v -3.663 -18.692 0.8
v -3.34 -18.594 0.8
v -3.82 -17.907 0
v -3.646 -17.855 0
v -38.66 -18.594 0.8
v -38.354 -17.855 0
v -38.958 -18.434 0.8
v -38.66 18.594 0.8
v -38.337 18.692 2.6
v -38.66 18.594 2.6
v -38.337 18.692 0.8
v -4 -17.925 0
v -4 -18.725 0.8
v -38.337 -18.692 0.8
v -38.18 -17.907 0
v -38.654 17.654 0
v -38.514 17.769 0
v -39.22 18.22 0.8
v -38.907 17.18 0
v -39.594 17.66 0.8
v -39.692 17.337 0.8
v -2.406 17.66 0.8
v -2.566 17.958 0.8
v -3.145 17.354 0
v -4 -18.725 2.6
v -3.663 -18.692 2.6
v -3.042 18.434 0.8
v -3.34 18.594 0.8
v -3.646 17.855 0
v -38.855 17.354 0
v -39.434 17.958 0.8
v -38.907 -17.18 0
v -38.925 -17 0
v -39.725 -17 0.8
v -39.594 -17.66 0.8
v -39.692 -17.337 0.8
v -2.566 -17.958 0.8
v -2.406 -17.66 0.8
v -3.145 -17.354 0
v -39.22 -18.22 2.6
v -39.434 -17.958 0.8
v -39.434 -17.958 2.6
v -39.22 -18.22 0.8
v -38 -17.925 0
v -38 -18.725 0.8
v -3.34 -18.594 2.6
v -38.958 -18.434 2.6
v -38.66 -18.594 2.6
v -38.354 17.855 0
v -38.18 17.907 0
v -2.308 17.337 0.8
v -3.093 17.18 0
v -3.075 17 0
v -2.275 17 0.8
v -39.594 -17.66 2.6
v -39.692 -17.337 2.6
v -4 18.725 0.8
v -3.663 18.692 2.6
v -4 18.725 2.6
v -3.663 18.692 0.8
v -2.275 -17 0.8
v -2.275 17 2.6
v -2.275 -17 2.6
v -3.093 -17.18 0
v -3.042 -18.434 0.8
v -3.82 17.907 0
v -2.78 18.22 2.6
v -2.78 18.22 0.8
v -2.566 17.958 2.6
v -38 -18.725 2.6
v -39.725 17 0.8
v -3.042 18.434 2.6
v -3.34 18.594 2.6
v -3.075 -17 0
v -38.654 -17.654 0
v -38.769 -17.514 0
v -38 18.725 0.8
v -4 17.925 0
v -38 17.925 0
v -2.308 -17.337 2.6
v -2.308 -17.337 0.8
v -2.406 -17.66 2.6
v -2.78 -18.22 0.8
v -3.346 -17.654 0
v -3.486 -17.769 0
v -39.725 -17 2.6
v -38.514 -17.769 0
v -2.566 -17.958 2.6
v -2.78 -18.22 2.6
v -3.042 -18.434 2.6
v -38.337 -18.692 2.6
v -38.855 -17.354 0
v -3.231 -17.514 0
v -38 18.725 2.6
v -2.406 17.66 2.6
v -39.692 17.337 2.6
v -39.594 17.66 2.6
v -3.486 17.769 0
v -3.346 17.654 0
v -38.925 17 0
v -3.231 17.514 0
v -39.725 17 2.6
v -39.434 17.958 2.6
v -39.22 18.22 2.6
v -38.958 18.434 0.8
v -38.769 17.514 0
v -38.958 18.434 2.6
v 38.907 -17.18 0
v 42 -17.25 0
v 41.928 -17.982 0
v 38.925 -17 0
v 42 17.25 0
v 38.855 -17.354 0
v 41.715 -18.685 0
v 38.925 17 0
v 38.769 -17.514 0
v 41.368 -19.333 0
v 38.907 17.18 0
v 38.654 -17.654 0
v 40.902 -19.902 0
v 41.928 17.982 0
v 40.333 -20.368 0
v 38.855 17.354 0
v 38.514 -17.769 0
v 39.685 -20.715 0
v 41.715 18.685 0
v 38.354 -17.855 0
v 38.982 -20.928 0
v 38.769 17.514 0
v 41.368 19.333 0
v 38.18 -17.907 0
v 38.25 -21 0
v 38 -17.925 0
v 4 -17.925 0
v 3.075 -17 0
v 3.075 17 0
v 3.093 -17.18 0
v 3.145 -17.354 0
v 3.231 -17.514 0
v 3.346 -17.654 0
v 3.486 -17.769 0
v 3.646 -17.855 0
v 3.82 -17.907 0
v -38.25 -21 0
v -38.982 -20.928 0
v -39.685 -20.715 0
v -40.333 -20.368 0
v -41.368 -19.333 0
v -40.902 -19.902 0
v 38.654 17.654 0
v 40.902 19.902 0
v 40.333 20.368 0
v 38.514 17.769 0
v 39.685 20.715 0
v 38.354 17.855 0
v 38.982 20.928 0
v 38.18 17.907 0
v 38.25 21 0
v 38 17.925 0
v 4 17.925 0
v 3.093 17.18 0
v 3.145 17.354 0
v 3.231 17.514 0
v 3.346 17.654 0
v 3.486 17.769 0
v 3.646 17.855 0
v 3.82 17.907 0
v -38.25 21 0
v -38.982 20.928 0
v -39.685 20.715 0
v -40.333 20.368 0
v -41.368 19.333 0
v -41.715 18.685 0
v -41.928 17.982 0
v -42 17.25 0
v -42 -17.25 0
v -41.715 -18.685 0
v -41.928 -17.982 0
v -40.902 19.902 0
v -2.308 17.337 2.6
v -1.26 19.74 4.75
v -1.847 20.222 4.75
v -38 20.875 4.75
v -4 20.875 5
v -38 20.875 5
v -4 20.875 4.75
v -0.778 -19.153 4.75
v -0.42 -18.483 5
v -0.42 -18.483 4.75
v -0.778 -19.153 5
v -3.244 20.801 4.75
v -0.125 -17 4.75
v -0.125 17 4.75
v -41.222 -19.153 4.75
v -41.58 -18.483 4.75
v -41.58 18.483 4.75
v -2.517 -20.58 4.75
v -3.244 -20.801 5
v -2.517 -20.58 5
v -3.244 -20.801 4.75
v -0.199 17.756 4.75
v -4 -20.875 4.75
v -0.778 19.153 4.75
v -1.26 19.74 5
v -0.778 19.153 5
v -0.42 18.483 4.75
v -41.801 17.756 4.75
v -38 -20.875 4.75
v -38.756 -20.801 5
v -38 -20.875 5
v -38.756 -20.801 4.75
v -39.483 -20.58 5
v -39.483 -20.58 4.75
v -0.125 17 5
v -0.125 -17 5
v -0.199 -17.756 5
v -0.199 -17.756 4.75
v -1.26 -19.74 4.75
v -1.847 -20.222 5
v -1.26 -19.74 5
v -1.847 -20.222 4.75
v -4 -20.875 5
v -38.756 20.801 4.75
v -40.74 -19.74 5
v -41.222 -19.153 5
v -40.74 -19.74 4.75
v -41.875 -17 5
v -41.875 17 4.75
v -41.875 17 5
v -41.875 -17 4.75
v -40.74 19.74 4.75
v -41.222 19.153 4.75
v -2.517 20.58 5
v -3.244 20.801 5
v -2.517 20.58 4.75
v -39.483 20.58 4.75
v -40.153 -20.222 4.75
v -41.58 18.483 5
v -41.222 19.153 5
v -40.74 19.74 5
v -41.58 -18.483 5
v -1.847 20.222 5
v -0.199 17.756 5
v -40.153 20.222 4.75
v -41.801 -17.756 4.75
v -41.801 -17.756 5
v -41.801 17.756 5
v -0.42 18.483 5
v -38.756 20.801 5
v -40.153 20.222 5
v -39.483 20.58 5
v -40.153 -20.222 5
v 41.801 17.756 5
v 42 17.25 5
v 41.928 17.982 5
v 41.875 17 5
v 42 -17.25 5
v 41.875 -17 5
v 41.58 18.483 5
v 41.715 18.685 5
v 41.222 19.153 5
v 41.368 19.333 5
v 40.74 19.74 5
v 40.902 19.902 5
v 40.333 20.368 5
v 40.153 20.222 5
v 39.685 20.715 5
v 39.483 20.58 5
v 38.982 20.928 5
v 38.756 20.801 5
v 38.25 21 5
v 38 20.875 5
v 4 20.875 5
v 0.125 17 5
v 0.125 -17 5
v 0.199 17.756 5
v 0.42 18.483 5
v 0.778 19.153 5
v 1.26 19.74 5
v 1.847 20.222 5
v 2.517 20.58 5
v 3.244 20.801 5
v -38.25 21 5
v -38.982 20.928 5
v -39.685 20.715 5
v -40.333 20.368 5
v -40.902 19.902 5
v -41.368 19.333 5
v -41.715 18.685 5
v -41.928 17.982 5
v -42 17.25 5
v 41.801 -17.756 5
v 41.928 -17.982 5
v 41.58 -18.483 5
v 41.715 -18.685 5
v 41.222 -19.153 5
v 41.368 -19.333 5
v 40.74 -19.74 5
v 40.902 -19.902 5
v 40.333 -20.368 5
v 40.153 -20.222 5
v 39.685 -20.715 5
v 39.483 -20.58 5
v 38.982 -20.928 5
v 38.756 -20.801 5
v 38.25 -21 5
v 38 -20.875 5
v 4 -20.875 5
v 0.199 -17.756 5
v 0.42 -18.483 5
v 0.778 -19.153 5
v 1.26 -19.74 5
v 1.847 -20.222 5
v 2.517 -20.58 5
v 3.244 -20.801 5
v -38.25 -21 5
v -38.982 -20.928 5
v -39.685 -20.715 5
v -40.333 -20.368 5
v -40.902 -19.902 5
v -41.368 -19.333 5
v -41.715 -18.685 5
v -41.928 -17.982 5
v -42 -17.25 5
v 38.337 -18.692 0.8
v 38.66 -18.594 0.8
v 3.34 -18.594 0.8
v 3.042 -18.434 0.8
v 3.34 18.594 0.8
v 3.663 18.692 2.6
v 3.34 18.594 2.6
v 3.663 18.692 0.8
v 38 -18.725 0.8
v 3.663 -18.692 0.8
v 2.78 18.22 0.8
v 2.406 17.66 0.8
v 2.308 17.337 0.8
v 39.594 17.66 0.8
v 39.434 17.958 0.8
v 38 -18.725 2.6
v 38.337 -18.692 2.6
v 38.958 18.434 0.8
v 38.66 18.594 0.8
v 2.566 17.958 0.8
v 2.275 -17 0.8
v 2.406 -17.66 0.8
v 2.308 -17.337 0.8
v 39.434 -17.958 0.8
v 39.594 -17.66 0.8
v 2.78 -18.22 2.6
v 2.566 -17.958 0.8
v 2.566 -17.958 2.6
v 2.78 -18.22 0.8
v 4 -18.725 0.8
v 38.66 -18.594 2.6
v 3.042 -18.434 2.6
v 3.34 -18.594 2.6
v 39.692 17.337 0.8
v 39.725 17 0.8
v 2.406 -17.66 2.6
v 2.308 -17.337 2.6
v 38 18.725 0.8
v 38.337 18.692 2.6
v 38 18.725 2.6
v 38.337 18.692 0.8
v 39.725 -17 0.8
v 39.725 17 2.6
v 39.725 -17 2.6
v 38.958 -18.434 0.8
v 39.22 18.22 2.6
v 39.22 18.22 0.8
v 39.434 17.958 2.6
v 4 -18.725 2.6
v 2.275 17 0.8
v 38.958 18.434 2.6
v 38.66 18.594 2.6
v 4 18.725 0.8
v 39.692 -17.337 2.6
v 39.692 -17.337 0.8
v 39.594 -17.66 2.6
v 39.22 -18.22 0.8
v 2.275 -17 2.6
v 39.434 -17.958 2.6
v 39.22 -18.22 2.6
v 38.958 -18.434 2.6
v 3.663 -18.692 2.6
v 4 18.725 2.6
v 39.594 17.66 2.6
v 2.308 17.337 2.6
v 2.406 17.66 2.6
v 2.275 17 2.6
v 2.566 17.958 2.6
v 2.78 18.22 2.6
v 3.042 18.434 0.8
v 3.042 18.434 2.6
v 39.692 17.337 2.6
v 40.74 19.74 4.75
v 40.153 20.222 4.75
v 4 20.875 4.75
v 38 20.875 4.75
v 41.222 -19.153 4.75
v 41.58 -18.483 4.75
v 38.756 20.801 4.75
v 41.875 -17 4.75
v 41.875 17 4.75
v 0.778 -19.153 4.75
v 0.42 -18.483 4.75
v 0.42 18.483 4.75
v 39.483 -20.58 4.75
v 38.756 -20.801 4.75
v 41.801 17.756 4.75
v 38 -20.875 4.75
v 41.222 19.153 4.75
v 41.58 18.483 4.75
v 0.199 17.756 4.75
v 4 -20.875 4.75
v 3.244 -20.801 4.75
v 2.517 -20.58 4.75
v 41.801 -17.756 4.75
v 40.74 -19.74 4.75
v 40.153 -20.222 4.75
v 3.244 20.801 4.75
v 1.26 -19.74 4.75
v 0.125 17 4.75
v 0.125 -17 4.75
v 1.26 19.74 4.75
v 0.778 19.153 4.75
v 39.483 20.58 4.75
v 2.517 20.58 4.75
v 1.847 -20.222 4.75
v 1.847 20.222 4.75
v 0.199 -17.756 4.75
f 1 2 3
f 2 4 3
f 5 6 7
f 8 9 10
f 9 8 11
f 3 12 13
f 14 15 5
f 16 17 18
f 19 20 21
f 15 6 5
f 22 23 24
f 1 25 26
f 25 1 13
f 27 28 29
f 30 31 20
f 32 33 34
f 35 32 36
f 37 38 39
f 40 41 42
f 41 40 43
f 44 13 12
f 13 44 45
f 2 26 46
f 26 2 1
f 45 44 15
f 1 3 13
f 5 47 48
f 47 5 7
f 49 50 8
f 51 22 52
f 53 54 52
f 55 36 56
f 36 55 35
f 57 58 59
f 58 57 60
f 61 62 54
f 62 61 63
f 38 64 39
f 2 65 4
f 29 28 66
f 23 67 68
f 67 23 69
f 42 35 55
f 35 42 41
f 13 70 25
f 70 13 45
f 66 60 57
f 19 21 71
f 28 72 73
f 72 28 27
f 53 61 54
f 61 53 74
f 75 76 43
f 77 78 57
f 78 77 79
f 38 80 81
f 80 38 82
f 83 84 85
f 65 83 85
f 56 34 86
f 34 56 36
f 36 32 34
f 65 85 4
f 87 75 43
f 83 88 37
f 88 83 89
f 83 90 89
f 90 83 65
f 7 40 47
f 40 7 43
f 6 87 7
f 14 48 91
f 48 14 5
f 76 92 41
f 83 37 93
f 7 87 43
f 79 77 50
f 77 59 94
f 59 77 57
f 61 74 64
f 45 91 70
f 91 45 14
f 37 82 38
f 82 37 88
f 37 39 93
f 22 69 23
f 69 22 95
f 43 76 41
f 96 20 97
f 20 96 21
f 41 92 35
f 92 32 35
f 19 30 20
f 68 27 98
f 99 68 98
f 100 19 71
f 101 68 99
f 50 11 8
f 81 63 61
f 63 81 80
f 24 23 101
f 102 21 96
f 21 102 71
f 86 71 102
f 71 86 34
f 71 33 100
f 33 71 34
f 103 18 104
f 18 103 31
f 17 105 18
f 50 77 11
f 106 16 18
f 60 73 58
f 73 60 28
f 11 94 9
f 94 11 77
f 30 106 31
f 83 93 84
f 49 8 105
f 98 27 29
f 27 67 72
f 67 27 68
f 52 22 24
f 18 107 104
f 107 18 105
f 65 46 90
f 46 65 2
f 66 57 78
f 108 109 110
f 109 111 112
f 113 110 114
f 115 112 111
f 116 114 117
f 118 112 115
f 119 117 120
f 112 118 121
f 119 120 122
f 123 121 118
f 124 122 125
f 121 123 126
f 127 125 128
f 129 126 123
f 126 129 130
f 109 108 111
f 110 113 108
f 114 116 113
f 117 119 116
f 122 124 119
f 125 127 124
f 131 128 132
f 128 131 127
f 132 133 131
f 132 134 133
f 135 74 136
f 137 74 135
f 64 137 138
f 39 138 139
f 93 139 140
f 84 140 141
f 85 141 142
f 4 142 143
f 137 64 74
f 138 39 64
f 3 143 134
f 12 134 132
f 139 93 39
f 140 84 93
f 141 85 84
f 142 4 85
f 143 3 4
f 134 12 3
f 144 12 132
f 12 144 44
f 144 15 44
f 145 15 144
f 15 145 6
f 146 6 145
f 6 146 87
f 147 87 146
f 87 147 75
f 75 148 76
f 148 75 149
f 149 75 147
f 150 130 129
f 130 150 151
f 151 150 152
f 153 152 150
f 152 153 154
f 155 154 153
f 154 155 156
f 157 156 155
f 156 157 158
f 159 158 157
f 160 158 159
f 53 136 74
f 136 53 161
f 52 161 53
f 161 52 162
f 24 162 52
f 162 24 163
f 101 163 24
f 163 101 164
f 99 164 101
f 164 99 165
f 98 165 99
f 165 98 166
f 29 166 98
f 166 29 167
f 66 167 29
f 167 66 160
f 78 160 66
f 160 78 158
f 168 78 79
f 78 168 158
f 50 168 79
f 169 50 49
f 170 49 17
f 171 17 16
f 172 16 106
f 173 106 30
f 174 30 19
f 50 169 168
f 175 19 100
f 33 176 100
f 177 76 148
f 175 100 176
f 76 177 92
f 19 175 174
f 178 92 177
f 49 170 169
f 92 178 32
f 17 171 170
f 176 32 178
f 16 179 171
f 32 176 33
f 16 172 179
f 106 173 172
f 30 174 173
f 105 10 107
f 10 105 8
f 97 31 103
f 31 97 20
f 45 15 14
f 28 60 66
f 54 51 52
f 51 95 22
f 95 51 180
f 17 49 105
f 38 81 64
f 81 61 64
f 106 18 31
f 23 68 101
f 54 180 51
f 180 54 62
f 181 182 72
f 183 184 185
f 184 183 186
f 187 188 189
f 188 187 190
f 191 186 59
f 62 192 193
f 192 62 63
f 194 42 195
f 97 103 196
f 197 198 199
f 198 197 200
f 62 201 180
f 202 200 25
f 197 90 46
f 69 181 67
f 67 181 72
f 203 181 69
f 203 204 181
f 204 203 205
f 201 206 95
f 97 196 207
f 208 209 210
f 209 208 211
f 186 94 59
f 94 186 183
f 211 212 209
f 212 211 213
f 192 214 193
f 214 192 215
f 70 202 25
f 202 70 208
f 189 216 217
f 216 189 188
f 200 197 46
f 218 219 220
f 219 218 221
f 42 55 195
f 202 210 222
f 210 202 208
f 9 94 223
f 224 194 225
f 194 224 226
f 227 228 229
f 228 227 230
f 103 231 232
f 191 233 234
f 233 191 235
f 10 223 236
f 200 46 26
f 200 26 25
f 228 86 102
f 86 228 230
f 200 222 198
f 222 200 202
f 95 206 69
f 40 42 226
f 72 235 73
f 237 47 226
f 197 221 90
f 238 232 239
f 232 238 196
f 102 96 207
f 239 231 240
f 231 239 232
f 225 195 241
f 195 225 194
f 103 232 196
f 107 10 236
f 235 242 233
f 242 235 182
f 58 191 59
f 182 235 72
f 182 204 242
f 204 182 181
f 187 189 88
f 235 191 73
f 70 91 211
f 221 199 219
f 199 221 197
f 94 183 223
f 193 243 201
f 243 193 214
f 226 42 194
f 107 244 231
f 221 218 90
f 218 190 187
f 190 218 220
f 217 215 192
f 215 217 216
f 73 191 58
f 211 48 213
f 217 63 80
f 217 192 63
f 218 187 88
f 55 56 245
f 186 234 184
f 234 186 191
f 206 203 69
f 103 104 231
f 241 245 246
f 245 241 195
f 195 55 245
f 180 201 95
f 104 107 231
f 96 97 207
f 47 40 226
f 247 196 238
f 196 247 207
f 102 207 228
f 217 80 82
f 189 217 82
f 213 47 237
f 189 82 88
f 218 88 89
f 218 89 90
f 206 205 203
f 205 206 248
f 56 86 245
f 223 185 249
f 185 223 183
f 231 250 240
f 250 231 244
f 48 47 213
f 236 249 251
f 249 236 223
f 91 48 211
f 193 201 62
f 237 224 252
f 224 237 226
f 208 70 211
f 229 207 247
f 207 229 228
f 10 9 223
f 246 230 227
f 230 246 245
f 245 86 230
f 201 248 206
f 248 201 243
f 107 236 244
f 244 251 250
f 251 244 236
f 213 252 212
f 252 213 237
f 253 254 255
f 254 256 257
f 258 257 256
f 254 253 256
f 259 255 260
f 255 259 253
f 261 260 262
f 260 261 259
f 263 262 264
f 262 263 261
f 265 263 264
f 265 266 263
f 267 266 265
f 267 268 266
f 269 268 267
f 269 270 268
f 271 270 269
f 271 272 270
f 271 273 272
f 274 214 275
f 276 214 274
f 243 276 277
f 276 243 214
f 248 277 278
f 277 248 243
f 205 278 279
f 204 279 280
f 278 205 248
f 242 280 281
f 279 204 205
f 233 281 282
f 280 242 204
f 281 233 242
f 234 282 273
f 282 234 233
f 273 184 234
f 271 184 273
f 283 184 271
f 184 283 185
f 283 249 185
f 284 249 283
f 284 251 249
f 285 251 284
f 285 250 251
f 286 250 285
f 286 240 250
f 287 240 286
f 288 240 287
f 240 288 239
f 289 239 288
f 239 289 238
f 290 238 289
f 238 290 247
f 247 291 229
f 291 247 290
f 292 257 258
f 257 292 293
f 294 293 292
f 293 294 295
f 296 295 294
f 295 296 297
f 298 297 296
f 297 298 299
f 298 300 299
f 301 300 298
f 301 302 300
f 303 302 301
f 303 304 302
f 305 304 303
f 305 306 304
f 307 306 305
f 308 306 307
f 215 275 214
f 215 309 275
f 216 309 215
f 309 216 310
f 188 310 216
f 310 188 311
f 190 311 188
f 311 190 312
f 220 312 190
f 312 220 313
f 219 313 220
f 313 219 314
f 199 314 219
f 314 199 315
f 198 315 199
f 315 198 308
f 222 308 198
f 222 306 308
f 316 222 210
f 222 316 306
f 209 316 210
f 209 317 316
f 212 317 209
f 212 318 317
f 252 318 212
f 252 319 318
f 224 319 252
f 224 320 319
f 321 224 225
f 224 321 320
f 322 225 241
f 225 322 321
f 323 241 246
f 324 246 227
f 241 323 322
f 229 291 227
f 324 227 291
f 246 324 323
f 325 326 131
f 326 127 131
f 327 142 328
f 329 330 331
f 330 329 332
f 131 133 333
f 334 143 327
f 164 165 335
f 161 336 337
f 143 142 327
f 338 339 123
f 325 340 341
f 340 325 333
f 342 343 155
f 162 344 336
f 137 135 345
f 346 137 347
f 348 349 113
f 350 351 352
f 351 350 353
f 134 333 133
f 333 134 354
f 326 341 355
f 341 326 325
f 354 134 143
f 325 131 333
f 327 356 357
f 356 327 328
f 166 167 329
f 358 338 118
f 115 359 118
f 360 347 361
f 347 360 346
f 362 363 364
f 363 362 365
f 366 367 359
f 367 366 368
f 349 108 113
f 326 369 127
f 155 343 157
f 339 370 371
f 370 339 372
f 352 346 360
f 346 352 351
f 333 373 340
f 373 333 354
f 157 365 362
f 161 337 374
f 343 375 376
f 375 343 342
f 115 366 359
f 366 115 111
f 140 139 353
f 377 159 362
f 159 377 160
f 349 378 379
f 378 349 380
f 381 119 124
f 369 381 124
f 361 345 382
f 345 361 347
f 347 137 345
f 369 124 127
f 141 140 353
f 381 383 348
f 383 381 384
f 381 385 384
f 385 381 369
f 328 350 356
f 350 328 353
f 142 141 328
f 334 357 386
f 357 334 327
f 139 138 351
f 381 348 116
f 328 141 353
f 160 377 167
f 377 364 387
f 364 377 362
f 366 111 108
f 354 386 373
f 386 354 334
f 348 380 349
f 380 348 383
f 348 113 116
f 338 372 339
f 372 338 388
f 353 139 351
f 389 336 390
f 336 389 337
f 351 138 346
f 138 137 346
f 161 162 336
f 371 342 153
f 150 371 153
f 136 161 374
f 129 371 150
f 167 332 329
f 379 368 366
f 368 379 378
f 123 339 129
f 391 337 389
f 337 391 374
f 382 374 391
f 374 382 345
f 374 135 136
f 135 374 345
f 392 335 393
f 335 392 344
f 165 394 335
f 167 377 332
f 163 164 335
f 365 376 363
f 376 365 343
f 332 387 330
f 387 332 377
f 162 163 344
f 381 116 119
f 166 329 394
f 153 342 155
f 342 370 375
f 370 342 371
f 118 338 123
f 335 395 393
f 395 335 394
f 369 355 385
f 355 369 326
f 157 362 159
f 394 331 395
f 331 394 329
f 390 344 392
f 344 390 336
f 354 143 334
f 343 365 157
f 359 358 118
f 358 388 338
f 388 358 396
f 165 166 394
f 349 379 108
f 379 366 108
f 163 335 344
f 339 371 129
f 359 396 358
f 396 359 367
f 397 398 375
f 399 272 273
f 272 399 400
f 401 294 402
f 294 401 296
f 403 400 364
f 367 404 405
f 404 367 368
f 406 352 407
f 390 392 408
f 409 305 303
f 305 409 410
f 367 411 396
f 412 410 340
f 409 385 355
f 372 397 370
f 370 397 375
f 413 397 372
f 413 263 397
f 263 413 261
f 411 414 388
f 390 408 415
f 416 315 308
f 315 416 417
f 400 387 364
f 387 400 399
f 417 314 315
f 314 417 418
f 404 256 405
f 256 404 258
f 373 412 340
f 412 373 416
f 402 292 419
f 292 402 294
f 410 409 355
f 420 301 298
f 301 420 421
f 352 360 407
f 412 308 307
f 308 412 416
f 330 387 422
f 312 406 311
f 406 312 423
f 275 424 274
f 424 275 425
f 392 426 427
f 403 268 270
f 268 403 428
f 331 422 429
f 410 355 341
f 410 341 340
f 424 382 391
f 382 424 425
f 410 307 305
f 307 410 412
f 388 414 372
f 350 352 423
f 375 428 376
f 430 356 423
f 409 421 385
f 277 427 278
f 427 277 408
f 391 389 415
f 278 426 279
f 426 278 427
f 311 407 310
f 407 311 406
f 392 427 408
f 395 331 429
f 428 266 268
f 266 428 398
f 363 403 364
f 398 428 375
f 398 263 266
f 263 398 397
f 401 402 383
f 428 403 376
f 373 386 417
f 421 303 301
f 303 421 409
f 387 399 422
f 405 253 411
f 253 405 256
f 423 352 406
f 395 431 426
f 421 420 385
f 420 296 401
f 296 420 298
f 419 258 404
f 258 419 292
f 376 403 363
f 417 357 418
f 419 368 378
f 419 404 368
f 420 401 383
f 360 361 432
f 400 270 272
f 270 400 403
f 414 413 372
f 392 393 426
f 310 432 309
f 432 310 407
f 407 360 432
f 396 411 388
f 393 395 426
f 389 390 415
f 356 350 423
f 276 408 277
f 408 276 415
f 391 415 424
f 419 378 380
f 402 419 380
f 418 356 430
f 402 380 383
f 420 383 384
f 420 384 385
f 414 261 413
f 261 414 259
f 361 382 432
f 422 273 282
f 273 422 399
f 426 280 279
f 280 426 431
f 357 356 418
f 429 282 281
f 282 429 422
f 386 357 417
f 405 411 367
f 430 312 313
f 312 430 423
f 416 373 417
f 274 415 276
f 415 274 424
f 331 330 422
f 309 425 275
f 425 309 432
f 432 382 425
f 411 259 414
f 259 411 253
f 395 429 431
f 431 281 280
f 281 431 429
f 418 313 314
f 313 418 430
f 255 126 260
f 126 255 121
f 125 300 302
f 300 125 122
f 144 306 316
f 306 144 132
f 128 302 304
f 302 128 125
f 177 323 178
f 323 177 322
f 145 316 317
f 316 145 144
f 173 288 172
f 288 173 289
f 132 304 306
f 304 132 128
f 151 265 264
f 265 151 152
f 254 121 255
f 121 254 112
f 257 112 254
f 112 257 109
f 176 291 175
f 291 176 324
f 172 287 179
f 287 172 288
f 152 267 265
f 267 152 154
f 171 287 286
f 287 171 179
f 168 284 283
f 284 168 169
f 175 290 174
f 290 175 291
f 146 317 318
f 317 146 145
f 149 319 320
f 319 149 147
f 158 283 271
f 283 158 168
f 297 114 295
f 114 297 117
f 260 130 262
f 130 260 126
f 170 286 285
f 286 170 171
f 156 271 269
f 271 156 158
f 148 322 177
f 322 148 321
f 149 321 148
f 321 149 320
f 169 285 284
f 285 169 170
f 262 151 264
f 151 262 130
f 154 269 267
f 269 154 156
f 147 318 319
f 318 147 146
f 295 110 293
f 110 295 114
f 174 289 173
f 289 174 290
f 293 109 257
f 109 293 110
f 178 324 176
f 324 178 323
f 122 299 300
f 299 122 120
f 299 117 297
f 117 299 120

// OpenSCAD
// file: gridfinity_std.scad
// ============================================================================
// gridfinity_std.scad — shared Gridfinity geometry for the OpenSCAD-engine
// modes of the `gridfinity` cartridge (cup / baseplate_scad / lid).
//
// CLEAN-ROOM PROVENANCE
//   Authored by Innovaciones MADFAM for the MADFAM Open Commons Hyperobjects
//   collection under CERN-OHL-W-2.0. Written from the publicly documented
//   Gridfinity specification (gridfinity.xyz, Zack Freedman / Voidstar Lab)
//   and from a recorded measurement baseline of the cartridge's own manifest
//   contract. No prior implementation of Gridfinity — in this repository, in
//   any archived satellite, or upstream — was read, consulted or copied while
//   writing this file. See ../NOTICE and docs/CLEANROOM-VERIFICATION.md.
//
// THE STANDARD IMPLEMENTED HERE
//   Grid module      42.0 mm in X and Y; one "unit" of footprint.
//   Height unit       7.0 mm in Z.
//   Bin footprint    42*n - 0.5 mm  (0.5 mm total clearance per pitch, so
//                    neighbouring bins in a drawer do not bind).
//   Corner radius     3.75 mm at the widest point of the profile.
//   Base profile     a three-step chamfer stack, bottom-up:
//                        0.80 mm chamfer at 45 deg
//                        1.80 mm straight wall
//                        2.15 mm chamfer at 45 deg
//                    = 4.75 mm; each 45 deg chamfer narrows the section by its
//                    own height on every side, so for a 41.5 mm cell the
//                    sections are 35.6 / 37.2 / 37.2 / 41.5 mm.
//   Foot height       5.00 mm: the 4.75 mm profile plus a 0.25 mm straight
//                    riser at full width, which is where the body starts.
//   Stacking lip     the same profile repeated at the top of a bin, so the
//                    foot of the bin above nests into it.
//   Socket clearance 0.25 mm nominal (0.125 mm per side), so a foot topping
//                    out at 41.5 mm enters a 41.75 mm socket mouth and the
//                    sockets of adjacent cells keep a 0.25 mm rib between them.
//   Magnet socket     6 mm dia x 2 mm deep, on a 26 x 26 mm square about the
//                    cell centre.
//   Screw hole       M3 clearance (3.4 mm), coaxial with the magnet sockets.
// ============================================================================

// No library include. Every primitive this cartridge needs — a rounded
// rectangle, a hull between two sections, a cylinder — is an OpenSCAD builtin,
// so the three modes render with nothing on OPENSCADPATH. BOSL2 (BSD-2-Clause)
// is available in the commons at libs/BOSL2 and would have been permitted, but
// declaring a dependency this code does not use would be a false statement
// about what it needs.

// -- Canonical constants -----------------------------------------------------
GF_PITCH        = 42.0;   // grid module, X and Y
GF_ZUNIT        =  7.0;   // height unit
GF_CLEAR        =  0.5;   // total bin clearance per pitch
GF_CELL         = GF_PITCH - GF_CLEAR;   // 41.5 mm, the bin's per-cell width
GF_R            =  3.75;  // corner radius at the widest section

GF_C1           =  0.80;  // lower chamfer height (45 deg)
GF_WALL         =  1.80;  // middle straight section
GF_C2           =  2.15;  // upper chamfer height (45 deg)
GF_PROFILE_H    = GF_C1 + GF_WALL + GF_C2;   // 4.75 mm
GF_RISER        =  0.25;  // straight riser above the profile
GF_FOOT_H       = GF_PROFILE_H + GF_RISER;   // 5.00 mm

GF_SOCKET_CLEAR =  0.125; // per side; 0.25 mm nominal diametral clearance

GF_MAG_D        =  6.0;   // magnet diameter
GF_MAG_H        =  2.0;   // magnet depth
GF_MAG_PITCH    = 26.0;   // magnet centres, square about the cell centre
GF_SCREW_D      =  3.4;   // M3 clearance

GF_LID_CLEAR    =  1.0;   // total lid clearance per pitch -> 42*n - 1.0

// Resolve the manifest's `fn` parameter. The manifest documents 0 as "auto";
// auto is 32, the value the platform's other rounded cartridges use.
function gf_fn(fn) = fn > 0 ? fn : 32;

// -- Rounded-rectangle prism -------------------------------------------------
// A prism of size [x, y] and height h, base at z = 0, centred in X and Y, with
// vertical edges filleted to radius r. r is clamped so it can never exceed half
// the shorter side.
module gf_rrect(x, y, h, r) {
    rr = max(0.01, min(r, min(x, y) / 2 - 0.001));
    linear_extrude(height = max(0.001, h))
        offset(r = rr) offset(r = -rr)
            square([max(0.02, x), max(0.02, y)], center = true);
}

// -- The base profile as a solid of revolution-free extrusion ----------------
// One cell's foot, base at z = 0, built as four stacked sections. `grow` widens
// every section on each side (used to make the baseplate socket, which is this
// same profile enlarged by the clearance).
//
//   z 0.00 .. 0.80   chamfer: (top - 2*C2 - 2*C1) -> (top - 2*C2)
//   z 0.80 .. 2.60   straight at (top - 2*C2)
//   z 2.60 .. 4.75   chamfer: (top - 2*C2) -> top
//   z 4.75 .. 5.00   straight at top
//
// The corner radius tracks the width so the fillet keeps a constant offset from
// the corner: r shrinks by the same amount the section does.
module gf_foot_profile(grow = 0, with_riser = true) {
    w_top = GF_CELL      + 2 * grow;
    w_mid = w_top - 2 * GF_C2;
    w_bot = w_mid - 2 * GF_C1;

    r_top = GF_R          + grow;
    r_mid = max(0.01, r_top - GF_C2);
    r_bot = max(0.01, r_mid - GF_C1);

    // lower chamfer
    hull() {
        gf_rrect(w_bot, w_bot, 0.001, r_bot);
        translate([0, 0, GF_C1]) gf_rrect(w_mid, w_mid, 0.001, r_mid);
    }
    // straight middle
    translate([0, 0, GF_C1]) gf_rrect(w_mid, w_mid, GF_WALL, r_mid);
    // upper chamfer
    translate([0, 0, GF_C1 + GF_WALL]) hull() {
        gf_rrect(w_mid, w_mid, 0.001, r_mid);
        translate([0, 0, GF_C2]) gf_rrect(w_top, w_top, 0.001, r_top);
    }
    // riser to the full 5 mm foot height
    if (with_riser)
        translate([0, 0, GF_PROFILE_H]) gf_rrect(w_top, w_top, GF_RISER, r_top);
}

// -- Grid helpers ------------------------------------------------------------
// Centre of cell (ix, iy) in a nx x ny grid, the whole grid centred on origin.
function gf_cell_x(ix, nx) = (ix - (nx - 1) / 2) * GF_PITCH;
function gf_cell_y(iy, ny) = (iy - (ny - 1) / 2) * GF_PITCH;

// The bin's overall footprint.
function gf_body_x(nx) = nx * GF_PITCH - GF_CLEAR;
function gf_body_y(ny) = ny * GF_PITCH - GF_CLEAR;

// The four magnet/screw centres of one cell, relative to the cell centre.
function gf_mag_offsets() = [
    [-GF_MAG_PITCH / 2, -GF_MAG_PITCH / 2],
    [ GF_MAG_PITCH / 2, -GF_MAG_PITCH / 2],
    [-GF_MAG_PITCH / 2,  GF_MAG_PITCH / 2],
    [ GF_MAG_PITCH / 2,  GF_MAG_PITCH / 2],
];
// main file
// ============================================================================
// baseplate.scad — Gridfinity baseplate, OpenSCAD engine, mode `baseplate_scad`.
//
// CLEAN-ROOM PROVENANCE
//   Authored by Innovaciones MADFAM for the MADFAM Open Commons Hyperobjects
//   collection under CERN-OHL-W-2.0, from the publicly documented Gridfinity
//   specification (gridfinity.xyz, Zack Freedman / Voidstar Lab) and from a
//   recorded measurement baseline of this cartridge's own manifest contract.
//   No prior Gridfinity implementation — in this repository's history, in any
//   archived satellite, or upstream — was read or consulted while writing it.
//   No third-party library is used: every primitive is an OpenSCAD
//   builtin. See ../NOTICE.
//
//   Standard implemented: 42 mm grid module, plate footprint 42*n exactly (no
//   clearance subtracted — plates butt against one another), one socket per
//   cell whose surface is the NEGATIVE of the bin's base profile grown by the
//   0.25 mm nominal clearance (0.125 mm per side), 5 mm plate thickness,
//   6 x 2 mm magnet cavities on 26 mm centres, M3 screw clearance.
//
// ONE SHARED PROFILE. The socket is `gf_foot_profile` grown by the clearance —
// the same function the bin's foot is built from — so the two mate by
// construction and cannot drift apart. A foot topping out at 41.5 mm enters a
// 41.75 mm socket mouth; adjacent sockets keep a 0.25 mm rib between them and
// 0.125 mm to the plate edge, so no two cutters ever meet edge-on.
// ============================================================================

include <gridfinity_std.scad>

// -- Manifest parameters (injected with -D by the platform) ------------------
width_units           = 2;      // grid units in X            [1 .. 6]
depth_units           = 1;      // grid units in Y            [1 .. 6]
bp_enable_magnets     = 0;      // 6 x 2 mm magnet cavities under each socket
bp_enable_screws      = 0;      // M3 screw holes through the plate corners
bp_corner_radius      = 3.75;   // radius of the PLATE outline  [0 .. 10]
bp_reduced_wall       = -1;     // -1 = full height, else the wall height (mm)
bp_reduced_wall_taper = 0;      // taper the reduced wall's top edge
fn                    = 0;      // 0 = auto (32)

$fn = gf_fn(fn);

// -- Derived ------------------------------------------------------------------
nx = max(1, min(6, round(width_units)));
ny = max(1, min(6, round(depth_units)));

plate_x = nx * GF_PITCH;        // 42*n exactly — plates butt, bins do not
plate_y = ny * GF_PITCH;
plate_h = GF_FOOT_H;            // 5.0 mm: the socket passes clean through

// The plate outline follows bp_corner_radius. The SOCKET corner radius does
// NOT: it is fixed by the standard at 3.75 mm plus the clearance, because a
// socket wider at the corners than a foot stops accepting a standard bin.
// (The baseline drove both from this one parameter; that is a defect this
// re-creation does not reproduce — see docs/CLEANROOM-VERIFICATION.md.)
plate_r = max(0, min(10, bp_corner_radius));

// Reduced wall: -1 keeps the full 5 mm plate. Any other value lowers the
// material BETWEEN the sockets to that height, leaving the sockets themselves
// full depth — a lighter plate that still seats a bin. It is clamped so the
// socket's own upper chamfer is never cut away.
rw_min = GF_C1 + GF_WALL;                       // 2.6 mm, keep at least this
reduced = bp_reduced_wall >= 0;
rw = reduced ? max(rw_min, min(plate_h, bp_reduced_wall)) : plate_h;

// ============================================================================
// Sockets — the negative of the bin foot, grown by the clearance
//
// With no magnets or screws the socket passes CLEAN THROUGH the 5 mm plate, as
// the standard has it: nothing sits under a bin's foot. Asking for magnets or
// screws needs material there to host them, so the socket is then raised onto a
// `mag_floor` mm floor. The plate's outside dimensions never change — the
// envelope is 42*n x 42*n x 5.0 either way — and the socket's mating surface is
// the same profile at the same clearance, only shortened at the bottom, where
// nothing mates.
// ============================================================================
mag_floor = (bp_enable_magnets > 0 || bp_enable_screws > 0) ? GF_MAG_H + 0.6 : 0;

module bp_sockets() {
    for (ix = [0 : nx - 1], iy = [0 : ny - 1])
        translate([gf_cell_x(ix, nx), gf_cell_y(iy, ny), mag_floor])
            // The riser is included so the socket reaches the plate's top face:
            // profile 4.75 mm + riser 0.25 mm = the full 5 mm thickness.
            gf_foot_profile(grow = GF_SOCKET_CLEAR);
}

// ============================================================================
// Reduced wall — lower the inter-socket material, optionally tapered
//
// The cut is everything above `rw` EXCEPT a collar around each socket that
// keeps the socket's full rim. With the taper on, the collar's outer edge is
// chamfered down to the reduced height instead of standing square.
// ============================================================================
module bp_reduced_cut() {
    if (reduced && rw < plate_h - 0.01) {
        collar = 1.6;   // material kept around each socket mouth
        difference() {
            translate([0, 0, rw])
                gf_rrect(plate_x + 2, plate_y + 2, plate_h - rw + 0.01, 0.01);
            for (ix = [0 : nx - 1], iy = [0 : ny - 1])
                translate([gf_cell_x(ix, nx), gf_cell_y(iy, ny), rw - 0.01])
                    if (bp_reduced_wall_taper > 0)
                        // taper: the collar falls away from the socket rim
                        hull() {
                            gf_rrect(GF_CELL + 2 * GF_SOCKET_CLEAR + 2 * collar,
                                     GF_CELL + 2 * GF_SOCKET_CLEAR + 2 * collar,
                                     0.001, GF_R + GF_SOCKET_CLEAR + collar);
                            translate([0, 0, plate_h - rw + 0.02])
                                gf_rrect(GF_CELL + 2 * GF_SOCKET_CLEAR,
                                         GF_CELL + 2 * GF_SOCKET_CLEAR,
                                         0.001, GF_R + GF_SOCKET_CLEAR);
                        }
                    else
                        gf_rrect(GF_CELL + 2 * GF_SOCKET_CLEAR + 2 * collar,
                                 GF_CELL + 2 * GF_SOCKET_CLEAR + 2 * collar,
                                 plate_h - rw + 0.03,
                                 GF_R + GF_SOCKET_CLEAR + collar);
        }
    }
}

// ============================================================================
// Magnet cavities and screw holes
//
// The magnets sit in the plate's underside, directly beneath the bin's own
// magnet sockets, so a bin with magnets is held down by the plate's. Screws
// pass clean through, coaxial with them.
// ============================================================================
module bp_mag_screw() {
    if (bp_enable_magnets > 0 || bp_enable_screws > 0)
        for (ix = [0 : nx - 1], iy = [0 : ny - 1])
            for (o = gf_mag_offsets())
                translate([gf_cell_x(ix, nx) + o[0],
                           gf_cell_y(iy, ny) + o[1], 0]) {
                    if (bp_enable_magnets > 0)
                        translate([0, 0, -0.01])
                            cylinder(d = GF_MAG_D, h = GF_MAG_H + 0.01);
                    if (bp_enable_screws > 0)
                        translate([0, 0, -0.01])
                            cylinder(d = GF_SCREW_D, h = plate_h + 0.02);
                }
}

// ============================================================================
// Assembly
// ============================================================================
difference() {
    gf_rrect(plate_x, plate_y, plate_h, plate_r);
    bp_sockets();
    bp_reduced_cut();
    bp_mag_screw();
}
